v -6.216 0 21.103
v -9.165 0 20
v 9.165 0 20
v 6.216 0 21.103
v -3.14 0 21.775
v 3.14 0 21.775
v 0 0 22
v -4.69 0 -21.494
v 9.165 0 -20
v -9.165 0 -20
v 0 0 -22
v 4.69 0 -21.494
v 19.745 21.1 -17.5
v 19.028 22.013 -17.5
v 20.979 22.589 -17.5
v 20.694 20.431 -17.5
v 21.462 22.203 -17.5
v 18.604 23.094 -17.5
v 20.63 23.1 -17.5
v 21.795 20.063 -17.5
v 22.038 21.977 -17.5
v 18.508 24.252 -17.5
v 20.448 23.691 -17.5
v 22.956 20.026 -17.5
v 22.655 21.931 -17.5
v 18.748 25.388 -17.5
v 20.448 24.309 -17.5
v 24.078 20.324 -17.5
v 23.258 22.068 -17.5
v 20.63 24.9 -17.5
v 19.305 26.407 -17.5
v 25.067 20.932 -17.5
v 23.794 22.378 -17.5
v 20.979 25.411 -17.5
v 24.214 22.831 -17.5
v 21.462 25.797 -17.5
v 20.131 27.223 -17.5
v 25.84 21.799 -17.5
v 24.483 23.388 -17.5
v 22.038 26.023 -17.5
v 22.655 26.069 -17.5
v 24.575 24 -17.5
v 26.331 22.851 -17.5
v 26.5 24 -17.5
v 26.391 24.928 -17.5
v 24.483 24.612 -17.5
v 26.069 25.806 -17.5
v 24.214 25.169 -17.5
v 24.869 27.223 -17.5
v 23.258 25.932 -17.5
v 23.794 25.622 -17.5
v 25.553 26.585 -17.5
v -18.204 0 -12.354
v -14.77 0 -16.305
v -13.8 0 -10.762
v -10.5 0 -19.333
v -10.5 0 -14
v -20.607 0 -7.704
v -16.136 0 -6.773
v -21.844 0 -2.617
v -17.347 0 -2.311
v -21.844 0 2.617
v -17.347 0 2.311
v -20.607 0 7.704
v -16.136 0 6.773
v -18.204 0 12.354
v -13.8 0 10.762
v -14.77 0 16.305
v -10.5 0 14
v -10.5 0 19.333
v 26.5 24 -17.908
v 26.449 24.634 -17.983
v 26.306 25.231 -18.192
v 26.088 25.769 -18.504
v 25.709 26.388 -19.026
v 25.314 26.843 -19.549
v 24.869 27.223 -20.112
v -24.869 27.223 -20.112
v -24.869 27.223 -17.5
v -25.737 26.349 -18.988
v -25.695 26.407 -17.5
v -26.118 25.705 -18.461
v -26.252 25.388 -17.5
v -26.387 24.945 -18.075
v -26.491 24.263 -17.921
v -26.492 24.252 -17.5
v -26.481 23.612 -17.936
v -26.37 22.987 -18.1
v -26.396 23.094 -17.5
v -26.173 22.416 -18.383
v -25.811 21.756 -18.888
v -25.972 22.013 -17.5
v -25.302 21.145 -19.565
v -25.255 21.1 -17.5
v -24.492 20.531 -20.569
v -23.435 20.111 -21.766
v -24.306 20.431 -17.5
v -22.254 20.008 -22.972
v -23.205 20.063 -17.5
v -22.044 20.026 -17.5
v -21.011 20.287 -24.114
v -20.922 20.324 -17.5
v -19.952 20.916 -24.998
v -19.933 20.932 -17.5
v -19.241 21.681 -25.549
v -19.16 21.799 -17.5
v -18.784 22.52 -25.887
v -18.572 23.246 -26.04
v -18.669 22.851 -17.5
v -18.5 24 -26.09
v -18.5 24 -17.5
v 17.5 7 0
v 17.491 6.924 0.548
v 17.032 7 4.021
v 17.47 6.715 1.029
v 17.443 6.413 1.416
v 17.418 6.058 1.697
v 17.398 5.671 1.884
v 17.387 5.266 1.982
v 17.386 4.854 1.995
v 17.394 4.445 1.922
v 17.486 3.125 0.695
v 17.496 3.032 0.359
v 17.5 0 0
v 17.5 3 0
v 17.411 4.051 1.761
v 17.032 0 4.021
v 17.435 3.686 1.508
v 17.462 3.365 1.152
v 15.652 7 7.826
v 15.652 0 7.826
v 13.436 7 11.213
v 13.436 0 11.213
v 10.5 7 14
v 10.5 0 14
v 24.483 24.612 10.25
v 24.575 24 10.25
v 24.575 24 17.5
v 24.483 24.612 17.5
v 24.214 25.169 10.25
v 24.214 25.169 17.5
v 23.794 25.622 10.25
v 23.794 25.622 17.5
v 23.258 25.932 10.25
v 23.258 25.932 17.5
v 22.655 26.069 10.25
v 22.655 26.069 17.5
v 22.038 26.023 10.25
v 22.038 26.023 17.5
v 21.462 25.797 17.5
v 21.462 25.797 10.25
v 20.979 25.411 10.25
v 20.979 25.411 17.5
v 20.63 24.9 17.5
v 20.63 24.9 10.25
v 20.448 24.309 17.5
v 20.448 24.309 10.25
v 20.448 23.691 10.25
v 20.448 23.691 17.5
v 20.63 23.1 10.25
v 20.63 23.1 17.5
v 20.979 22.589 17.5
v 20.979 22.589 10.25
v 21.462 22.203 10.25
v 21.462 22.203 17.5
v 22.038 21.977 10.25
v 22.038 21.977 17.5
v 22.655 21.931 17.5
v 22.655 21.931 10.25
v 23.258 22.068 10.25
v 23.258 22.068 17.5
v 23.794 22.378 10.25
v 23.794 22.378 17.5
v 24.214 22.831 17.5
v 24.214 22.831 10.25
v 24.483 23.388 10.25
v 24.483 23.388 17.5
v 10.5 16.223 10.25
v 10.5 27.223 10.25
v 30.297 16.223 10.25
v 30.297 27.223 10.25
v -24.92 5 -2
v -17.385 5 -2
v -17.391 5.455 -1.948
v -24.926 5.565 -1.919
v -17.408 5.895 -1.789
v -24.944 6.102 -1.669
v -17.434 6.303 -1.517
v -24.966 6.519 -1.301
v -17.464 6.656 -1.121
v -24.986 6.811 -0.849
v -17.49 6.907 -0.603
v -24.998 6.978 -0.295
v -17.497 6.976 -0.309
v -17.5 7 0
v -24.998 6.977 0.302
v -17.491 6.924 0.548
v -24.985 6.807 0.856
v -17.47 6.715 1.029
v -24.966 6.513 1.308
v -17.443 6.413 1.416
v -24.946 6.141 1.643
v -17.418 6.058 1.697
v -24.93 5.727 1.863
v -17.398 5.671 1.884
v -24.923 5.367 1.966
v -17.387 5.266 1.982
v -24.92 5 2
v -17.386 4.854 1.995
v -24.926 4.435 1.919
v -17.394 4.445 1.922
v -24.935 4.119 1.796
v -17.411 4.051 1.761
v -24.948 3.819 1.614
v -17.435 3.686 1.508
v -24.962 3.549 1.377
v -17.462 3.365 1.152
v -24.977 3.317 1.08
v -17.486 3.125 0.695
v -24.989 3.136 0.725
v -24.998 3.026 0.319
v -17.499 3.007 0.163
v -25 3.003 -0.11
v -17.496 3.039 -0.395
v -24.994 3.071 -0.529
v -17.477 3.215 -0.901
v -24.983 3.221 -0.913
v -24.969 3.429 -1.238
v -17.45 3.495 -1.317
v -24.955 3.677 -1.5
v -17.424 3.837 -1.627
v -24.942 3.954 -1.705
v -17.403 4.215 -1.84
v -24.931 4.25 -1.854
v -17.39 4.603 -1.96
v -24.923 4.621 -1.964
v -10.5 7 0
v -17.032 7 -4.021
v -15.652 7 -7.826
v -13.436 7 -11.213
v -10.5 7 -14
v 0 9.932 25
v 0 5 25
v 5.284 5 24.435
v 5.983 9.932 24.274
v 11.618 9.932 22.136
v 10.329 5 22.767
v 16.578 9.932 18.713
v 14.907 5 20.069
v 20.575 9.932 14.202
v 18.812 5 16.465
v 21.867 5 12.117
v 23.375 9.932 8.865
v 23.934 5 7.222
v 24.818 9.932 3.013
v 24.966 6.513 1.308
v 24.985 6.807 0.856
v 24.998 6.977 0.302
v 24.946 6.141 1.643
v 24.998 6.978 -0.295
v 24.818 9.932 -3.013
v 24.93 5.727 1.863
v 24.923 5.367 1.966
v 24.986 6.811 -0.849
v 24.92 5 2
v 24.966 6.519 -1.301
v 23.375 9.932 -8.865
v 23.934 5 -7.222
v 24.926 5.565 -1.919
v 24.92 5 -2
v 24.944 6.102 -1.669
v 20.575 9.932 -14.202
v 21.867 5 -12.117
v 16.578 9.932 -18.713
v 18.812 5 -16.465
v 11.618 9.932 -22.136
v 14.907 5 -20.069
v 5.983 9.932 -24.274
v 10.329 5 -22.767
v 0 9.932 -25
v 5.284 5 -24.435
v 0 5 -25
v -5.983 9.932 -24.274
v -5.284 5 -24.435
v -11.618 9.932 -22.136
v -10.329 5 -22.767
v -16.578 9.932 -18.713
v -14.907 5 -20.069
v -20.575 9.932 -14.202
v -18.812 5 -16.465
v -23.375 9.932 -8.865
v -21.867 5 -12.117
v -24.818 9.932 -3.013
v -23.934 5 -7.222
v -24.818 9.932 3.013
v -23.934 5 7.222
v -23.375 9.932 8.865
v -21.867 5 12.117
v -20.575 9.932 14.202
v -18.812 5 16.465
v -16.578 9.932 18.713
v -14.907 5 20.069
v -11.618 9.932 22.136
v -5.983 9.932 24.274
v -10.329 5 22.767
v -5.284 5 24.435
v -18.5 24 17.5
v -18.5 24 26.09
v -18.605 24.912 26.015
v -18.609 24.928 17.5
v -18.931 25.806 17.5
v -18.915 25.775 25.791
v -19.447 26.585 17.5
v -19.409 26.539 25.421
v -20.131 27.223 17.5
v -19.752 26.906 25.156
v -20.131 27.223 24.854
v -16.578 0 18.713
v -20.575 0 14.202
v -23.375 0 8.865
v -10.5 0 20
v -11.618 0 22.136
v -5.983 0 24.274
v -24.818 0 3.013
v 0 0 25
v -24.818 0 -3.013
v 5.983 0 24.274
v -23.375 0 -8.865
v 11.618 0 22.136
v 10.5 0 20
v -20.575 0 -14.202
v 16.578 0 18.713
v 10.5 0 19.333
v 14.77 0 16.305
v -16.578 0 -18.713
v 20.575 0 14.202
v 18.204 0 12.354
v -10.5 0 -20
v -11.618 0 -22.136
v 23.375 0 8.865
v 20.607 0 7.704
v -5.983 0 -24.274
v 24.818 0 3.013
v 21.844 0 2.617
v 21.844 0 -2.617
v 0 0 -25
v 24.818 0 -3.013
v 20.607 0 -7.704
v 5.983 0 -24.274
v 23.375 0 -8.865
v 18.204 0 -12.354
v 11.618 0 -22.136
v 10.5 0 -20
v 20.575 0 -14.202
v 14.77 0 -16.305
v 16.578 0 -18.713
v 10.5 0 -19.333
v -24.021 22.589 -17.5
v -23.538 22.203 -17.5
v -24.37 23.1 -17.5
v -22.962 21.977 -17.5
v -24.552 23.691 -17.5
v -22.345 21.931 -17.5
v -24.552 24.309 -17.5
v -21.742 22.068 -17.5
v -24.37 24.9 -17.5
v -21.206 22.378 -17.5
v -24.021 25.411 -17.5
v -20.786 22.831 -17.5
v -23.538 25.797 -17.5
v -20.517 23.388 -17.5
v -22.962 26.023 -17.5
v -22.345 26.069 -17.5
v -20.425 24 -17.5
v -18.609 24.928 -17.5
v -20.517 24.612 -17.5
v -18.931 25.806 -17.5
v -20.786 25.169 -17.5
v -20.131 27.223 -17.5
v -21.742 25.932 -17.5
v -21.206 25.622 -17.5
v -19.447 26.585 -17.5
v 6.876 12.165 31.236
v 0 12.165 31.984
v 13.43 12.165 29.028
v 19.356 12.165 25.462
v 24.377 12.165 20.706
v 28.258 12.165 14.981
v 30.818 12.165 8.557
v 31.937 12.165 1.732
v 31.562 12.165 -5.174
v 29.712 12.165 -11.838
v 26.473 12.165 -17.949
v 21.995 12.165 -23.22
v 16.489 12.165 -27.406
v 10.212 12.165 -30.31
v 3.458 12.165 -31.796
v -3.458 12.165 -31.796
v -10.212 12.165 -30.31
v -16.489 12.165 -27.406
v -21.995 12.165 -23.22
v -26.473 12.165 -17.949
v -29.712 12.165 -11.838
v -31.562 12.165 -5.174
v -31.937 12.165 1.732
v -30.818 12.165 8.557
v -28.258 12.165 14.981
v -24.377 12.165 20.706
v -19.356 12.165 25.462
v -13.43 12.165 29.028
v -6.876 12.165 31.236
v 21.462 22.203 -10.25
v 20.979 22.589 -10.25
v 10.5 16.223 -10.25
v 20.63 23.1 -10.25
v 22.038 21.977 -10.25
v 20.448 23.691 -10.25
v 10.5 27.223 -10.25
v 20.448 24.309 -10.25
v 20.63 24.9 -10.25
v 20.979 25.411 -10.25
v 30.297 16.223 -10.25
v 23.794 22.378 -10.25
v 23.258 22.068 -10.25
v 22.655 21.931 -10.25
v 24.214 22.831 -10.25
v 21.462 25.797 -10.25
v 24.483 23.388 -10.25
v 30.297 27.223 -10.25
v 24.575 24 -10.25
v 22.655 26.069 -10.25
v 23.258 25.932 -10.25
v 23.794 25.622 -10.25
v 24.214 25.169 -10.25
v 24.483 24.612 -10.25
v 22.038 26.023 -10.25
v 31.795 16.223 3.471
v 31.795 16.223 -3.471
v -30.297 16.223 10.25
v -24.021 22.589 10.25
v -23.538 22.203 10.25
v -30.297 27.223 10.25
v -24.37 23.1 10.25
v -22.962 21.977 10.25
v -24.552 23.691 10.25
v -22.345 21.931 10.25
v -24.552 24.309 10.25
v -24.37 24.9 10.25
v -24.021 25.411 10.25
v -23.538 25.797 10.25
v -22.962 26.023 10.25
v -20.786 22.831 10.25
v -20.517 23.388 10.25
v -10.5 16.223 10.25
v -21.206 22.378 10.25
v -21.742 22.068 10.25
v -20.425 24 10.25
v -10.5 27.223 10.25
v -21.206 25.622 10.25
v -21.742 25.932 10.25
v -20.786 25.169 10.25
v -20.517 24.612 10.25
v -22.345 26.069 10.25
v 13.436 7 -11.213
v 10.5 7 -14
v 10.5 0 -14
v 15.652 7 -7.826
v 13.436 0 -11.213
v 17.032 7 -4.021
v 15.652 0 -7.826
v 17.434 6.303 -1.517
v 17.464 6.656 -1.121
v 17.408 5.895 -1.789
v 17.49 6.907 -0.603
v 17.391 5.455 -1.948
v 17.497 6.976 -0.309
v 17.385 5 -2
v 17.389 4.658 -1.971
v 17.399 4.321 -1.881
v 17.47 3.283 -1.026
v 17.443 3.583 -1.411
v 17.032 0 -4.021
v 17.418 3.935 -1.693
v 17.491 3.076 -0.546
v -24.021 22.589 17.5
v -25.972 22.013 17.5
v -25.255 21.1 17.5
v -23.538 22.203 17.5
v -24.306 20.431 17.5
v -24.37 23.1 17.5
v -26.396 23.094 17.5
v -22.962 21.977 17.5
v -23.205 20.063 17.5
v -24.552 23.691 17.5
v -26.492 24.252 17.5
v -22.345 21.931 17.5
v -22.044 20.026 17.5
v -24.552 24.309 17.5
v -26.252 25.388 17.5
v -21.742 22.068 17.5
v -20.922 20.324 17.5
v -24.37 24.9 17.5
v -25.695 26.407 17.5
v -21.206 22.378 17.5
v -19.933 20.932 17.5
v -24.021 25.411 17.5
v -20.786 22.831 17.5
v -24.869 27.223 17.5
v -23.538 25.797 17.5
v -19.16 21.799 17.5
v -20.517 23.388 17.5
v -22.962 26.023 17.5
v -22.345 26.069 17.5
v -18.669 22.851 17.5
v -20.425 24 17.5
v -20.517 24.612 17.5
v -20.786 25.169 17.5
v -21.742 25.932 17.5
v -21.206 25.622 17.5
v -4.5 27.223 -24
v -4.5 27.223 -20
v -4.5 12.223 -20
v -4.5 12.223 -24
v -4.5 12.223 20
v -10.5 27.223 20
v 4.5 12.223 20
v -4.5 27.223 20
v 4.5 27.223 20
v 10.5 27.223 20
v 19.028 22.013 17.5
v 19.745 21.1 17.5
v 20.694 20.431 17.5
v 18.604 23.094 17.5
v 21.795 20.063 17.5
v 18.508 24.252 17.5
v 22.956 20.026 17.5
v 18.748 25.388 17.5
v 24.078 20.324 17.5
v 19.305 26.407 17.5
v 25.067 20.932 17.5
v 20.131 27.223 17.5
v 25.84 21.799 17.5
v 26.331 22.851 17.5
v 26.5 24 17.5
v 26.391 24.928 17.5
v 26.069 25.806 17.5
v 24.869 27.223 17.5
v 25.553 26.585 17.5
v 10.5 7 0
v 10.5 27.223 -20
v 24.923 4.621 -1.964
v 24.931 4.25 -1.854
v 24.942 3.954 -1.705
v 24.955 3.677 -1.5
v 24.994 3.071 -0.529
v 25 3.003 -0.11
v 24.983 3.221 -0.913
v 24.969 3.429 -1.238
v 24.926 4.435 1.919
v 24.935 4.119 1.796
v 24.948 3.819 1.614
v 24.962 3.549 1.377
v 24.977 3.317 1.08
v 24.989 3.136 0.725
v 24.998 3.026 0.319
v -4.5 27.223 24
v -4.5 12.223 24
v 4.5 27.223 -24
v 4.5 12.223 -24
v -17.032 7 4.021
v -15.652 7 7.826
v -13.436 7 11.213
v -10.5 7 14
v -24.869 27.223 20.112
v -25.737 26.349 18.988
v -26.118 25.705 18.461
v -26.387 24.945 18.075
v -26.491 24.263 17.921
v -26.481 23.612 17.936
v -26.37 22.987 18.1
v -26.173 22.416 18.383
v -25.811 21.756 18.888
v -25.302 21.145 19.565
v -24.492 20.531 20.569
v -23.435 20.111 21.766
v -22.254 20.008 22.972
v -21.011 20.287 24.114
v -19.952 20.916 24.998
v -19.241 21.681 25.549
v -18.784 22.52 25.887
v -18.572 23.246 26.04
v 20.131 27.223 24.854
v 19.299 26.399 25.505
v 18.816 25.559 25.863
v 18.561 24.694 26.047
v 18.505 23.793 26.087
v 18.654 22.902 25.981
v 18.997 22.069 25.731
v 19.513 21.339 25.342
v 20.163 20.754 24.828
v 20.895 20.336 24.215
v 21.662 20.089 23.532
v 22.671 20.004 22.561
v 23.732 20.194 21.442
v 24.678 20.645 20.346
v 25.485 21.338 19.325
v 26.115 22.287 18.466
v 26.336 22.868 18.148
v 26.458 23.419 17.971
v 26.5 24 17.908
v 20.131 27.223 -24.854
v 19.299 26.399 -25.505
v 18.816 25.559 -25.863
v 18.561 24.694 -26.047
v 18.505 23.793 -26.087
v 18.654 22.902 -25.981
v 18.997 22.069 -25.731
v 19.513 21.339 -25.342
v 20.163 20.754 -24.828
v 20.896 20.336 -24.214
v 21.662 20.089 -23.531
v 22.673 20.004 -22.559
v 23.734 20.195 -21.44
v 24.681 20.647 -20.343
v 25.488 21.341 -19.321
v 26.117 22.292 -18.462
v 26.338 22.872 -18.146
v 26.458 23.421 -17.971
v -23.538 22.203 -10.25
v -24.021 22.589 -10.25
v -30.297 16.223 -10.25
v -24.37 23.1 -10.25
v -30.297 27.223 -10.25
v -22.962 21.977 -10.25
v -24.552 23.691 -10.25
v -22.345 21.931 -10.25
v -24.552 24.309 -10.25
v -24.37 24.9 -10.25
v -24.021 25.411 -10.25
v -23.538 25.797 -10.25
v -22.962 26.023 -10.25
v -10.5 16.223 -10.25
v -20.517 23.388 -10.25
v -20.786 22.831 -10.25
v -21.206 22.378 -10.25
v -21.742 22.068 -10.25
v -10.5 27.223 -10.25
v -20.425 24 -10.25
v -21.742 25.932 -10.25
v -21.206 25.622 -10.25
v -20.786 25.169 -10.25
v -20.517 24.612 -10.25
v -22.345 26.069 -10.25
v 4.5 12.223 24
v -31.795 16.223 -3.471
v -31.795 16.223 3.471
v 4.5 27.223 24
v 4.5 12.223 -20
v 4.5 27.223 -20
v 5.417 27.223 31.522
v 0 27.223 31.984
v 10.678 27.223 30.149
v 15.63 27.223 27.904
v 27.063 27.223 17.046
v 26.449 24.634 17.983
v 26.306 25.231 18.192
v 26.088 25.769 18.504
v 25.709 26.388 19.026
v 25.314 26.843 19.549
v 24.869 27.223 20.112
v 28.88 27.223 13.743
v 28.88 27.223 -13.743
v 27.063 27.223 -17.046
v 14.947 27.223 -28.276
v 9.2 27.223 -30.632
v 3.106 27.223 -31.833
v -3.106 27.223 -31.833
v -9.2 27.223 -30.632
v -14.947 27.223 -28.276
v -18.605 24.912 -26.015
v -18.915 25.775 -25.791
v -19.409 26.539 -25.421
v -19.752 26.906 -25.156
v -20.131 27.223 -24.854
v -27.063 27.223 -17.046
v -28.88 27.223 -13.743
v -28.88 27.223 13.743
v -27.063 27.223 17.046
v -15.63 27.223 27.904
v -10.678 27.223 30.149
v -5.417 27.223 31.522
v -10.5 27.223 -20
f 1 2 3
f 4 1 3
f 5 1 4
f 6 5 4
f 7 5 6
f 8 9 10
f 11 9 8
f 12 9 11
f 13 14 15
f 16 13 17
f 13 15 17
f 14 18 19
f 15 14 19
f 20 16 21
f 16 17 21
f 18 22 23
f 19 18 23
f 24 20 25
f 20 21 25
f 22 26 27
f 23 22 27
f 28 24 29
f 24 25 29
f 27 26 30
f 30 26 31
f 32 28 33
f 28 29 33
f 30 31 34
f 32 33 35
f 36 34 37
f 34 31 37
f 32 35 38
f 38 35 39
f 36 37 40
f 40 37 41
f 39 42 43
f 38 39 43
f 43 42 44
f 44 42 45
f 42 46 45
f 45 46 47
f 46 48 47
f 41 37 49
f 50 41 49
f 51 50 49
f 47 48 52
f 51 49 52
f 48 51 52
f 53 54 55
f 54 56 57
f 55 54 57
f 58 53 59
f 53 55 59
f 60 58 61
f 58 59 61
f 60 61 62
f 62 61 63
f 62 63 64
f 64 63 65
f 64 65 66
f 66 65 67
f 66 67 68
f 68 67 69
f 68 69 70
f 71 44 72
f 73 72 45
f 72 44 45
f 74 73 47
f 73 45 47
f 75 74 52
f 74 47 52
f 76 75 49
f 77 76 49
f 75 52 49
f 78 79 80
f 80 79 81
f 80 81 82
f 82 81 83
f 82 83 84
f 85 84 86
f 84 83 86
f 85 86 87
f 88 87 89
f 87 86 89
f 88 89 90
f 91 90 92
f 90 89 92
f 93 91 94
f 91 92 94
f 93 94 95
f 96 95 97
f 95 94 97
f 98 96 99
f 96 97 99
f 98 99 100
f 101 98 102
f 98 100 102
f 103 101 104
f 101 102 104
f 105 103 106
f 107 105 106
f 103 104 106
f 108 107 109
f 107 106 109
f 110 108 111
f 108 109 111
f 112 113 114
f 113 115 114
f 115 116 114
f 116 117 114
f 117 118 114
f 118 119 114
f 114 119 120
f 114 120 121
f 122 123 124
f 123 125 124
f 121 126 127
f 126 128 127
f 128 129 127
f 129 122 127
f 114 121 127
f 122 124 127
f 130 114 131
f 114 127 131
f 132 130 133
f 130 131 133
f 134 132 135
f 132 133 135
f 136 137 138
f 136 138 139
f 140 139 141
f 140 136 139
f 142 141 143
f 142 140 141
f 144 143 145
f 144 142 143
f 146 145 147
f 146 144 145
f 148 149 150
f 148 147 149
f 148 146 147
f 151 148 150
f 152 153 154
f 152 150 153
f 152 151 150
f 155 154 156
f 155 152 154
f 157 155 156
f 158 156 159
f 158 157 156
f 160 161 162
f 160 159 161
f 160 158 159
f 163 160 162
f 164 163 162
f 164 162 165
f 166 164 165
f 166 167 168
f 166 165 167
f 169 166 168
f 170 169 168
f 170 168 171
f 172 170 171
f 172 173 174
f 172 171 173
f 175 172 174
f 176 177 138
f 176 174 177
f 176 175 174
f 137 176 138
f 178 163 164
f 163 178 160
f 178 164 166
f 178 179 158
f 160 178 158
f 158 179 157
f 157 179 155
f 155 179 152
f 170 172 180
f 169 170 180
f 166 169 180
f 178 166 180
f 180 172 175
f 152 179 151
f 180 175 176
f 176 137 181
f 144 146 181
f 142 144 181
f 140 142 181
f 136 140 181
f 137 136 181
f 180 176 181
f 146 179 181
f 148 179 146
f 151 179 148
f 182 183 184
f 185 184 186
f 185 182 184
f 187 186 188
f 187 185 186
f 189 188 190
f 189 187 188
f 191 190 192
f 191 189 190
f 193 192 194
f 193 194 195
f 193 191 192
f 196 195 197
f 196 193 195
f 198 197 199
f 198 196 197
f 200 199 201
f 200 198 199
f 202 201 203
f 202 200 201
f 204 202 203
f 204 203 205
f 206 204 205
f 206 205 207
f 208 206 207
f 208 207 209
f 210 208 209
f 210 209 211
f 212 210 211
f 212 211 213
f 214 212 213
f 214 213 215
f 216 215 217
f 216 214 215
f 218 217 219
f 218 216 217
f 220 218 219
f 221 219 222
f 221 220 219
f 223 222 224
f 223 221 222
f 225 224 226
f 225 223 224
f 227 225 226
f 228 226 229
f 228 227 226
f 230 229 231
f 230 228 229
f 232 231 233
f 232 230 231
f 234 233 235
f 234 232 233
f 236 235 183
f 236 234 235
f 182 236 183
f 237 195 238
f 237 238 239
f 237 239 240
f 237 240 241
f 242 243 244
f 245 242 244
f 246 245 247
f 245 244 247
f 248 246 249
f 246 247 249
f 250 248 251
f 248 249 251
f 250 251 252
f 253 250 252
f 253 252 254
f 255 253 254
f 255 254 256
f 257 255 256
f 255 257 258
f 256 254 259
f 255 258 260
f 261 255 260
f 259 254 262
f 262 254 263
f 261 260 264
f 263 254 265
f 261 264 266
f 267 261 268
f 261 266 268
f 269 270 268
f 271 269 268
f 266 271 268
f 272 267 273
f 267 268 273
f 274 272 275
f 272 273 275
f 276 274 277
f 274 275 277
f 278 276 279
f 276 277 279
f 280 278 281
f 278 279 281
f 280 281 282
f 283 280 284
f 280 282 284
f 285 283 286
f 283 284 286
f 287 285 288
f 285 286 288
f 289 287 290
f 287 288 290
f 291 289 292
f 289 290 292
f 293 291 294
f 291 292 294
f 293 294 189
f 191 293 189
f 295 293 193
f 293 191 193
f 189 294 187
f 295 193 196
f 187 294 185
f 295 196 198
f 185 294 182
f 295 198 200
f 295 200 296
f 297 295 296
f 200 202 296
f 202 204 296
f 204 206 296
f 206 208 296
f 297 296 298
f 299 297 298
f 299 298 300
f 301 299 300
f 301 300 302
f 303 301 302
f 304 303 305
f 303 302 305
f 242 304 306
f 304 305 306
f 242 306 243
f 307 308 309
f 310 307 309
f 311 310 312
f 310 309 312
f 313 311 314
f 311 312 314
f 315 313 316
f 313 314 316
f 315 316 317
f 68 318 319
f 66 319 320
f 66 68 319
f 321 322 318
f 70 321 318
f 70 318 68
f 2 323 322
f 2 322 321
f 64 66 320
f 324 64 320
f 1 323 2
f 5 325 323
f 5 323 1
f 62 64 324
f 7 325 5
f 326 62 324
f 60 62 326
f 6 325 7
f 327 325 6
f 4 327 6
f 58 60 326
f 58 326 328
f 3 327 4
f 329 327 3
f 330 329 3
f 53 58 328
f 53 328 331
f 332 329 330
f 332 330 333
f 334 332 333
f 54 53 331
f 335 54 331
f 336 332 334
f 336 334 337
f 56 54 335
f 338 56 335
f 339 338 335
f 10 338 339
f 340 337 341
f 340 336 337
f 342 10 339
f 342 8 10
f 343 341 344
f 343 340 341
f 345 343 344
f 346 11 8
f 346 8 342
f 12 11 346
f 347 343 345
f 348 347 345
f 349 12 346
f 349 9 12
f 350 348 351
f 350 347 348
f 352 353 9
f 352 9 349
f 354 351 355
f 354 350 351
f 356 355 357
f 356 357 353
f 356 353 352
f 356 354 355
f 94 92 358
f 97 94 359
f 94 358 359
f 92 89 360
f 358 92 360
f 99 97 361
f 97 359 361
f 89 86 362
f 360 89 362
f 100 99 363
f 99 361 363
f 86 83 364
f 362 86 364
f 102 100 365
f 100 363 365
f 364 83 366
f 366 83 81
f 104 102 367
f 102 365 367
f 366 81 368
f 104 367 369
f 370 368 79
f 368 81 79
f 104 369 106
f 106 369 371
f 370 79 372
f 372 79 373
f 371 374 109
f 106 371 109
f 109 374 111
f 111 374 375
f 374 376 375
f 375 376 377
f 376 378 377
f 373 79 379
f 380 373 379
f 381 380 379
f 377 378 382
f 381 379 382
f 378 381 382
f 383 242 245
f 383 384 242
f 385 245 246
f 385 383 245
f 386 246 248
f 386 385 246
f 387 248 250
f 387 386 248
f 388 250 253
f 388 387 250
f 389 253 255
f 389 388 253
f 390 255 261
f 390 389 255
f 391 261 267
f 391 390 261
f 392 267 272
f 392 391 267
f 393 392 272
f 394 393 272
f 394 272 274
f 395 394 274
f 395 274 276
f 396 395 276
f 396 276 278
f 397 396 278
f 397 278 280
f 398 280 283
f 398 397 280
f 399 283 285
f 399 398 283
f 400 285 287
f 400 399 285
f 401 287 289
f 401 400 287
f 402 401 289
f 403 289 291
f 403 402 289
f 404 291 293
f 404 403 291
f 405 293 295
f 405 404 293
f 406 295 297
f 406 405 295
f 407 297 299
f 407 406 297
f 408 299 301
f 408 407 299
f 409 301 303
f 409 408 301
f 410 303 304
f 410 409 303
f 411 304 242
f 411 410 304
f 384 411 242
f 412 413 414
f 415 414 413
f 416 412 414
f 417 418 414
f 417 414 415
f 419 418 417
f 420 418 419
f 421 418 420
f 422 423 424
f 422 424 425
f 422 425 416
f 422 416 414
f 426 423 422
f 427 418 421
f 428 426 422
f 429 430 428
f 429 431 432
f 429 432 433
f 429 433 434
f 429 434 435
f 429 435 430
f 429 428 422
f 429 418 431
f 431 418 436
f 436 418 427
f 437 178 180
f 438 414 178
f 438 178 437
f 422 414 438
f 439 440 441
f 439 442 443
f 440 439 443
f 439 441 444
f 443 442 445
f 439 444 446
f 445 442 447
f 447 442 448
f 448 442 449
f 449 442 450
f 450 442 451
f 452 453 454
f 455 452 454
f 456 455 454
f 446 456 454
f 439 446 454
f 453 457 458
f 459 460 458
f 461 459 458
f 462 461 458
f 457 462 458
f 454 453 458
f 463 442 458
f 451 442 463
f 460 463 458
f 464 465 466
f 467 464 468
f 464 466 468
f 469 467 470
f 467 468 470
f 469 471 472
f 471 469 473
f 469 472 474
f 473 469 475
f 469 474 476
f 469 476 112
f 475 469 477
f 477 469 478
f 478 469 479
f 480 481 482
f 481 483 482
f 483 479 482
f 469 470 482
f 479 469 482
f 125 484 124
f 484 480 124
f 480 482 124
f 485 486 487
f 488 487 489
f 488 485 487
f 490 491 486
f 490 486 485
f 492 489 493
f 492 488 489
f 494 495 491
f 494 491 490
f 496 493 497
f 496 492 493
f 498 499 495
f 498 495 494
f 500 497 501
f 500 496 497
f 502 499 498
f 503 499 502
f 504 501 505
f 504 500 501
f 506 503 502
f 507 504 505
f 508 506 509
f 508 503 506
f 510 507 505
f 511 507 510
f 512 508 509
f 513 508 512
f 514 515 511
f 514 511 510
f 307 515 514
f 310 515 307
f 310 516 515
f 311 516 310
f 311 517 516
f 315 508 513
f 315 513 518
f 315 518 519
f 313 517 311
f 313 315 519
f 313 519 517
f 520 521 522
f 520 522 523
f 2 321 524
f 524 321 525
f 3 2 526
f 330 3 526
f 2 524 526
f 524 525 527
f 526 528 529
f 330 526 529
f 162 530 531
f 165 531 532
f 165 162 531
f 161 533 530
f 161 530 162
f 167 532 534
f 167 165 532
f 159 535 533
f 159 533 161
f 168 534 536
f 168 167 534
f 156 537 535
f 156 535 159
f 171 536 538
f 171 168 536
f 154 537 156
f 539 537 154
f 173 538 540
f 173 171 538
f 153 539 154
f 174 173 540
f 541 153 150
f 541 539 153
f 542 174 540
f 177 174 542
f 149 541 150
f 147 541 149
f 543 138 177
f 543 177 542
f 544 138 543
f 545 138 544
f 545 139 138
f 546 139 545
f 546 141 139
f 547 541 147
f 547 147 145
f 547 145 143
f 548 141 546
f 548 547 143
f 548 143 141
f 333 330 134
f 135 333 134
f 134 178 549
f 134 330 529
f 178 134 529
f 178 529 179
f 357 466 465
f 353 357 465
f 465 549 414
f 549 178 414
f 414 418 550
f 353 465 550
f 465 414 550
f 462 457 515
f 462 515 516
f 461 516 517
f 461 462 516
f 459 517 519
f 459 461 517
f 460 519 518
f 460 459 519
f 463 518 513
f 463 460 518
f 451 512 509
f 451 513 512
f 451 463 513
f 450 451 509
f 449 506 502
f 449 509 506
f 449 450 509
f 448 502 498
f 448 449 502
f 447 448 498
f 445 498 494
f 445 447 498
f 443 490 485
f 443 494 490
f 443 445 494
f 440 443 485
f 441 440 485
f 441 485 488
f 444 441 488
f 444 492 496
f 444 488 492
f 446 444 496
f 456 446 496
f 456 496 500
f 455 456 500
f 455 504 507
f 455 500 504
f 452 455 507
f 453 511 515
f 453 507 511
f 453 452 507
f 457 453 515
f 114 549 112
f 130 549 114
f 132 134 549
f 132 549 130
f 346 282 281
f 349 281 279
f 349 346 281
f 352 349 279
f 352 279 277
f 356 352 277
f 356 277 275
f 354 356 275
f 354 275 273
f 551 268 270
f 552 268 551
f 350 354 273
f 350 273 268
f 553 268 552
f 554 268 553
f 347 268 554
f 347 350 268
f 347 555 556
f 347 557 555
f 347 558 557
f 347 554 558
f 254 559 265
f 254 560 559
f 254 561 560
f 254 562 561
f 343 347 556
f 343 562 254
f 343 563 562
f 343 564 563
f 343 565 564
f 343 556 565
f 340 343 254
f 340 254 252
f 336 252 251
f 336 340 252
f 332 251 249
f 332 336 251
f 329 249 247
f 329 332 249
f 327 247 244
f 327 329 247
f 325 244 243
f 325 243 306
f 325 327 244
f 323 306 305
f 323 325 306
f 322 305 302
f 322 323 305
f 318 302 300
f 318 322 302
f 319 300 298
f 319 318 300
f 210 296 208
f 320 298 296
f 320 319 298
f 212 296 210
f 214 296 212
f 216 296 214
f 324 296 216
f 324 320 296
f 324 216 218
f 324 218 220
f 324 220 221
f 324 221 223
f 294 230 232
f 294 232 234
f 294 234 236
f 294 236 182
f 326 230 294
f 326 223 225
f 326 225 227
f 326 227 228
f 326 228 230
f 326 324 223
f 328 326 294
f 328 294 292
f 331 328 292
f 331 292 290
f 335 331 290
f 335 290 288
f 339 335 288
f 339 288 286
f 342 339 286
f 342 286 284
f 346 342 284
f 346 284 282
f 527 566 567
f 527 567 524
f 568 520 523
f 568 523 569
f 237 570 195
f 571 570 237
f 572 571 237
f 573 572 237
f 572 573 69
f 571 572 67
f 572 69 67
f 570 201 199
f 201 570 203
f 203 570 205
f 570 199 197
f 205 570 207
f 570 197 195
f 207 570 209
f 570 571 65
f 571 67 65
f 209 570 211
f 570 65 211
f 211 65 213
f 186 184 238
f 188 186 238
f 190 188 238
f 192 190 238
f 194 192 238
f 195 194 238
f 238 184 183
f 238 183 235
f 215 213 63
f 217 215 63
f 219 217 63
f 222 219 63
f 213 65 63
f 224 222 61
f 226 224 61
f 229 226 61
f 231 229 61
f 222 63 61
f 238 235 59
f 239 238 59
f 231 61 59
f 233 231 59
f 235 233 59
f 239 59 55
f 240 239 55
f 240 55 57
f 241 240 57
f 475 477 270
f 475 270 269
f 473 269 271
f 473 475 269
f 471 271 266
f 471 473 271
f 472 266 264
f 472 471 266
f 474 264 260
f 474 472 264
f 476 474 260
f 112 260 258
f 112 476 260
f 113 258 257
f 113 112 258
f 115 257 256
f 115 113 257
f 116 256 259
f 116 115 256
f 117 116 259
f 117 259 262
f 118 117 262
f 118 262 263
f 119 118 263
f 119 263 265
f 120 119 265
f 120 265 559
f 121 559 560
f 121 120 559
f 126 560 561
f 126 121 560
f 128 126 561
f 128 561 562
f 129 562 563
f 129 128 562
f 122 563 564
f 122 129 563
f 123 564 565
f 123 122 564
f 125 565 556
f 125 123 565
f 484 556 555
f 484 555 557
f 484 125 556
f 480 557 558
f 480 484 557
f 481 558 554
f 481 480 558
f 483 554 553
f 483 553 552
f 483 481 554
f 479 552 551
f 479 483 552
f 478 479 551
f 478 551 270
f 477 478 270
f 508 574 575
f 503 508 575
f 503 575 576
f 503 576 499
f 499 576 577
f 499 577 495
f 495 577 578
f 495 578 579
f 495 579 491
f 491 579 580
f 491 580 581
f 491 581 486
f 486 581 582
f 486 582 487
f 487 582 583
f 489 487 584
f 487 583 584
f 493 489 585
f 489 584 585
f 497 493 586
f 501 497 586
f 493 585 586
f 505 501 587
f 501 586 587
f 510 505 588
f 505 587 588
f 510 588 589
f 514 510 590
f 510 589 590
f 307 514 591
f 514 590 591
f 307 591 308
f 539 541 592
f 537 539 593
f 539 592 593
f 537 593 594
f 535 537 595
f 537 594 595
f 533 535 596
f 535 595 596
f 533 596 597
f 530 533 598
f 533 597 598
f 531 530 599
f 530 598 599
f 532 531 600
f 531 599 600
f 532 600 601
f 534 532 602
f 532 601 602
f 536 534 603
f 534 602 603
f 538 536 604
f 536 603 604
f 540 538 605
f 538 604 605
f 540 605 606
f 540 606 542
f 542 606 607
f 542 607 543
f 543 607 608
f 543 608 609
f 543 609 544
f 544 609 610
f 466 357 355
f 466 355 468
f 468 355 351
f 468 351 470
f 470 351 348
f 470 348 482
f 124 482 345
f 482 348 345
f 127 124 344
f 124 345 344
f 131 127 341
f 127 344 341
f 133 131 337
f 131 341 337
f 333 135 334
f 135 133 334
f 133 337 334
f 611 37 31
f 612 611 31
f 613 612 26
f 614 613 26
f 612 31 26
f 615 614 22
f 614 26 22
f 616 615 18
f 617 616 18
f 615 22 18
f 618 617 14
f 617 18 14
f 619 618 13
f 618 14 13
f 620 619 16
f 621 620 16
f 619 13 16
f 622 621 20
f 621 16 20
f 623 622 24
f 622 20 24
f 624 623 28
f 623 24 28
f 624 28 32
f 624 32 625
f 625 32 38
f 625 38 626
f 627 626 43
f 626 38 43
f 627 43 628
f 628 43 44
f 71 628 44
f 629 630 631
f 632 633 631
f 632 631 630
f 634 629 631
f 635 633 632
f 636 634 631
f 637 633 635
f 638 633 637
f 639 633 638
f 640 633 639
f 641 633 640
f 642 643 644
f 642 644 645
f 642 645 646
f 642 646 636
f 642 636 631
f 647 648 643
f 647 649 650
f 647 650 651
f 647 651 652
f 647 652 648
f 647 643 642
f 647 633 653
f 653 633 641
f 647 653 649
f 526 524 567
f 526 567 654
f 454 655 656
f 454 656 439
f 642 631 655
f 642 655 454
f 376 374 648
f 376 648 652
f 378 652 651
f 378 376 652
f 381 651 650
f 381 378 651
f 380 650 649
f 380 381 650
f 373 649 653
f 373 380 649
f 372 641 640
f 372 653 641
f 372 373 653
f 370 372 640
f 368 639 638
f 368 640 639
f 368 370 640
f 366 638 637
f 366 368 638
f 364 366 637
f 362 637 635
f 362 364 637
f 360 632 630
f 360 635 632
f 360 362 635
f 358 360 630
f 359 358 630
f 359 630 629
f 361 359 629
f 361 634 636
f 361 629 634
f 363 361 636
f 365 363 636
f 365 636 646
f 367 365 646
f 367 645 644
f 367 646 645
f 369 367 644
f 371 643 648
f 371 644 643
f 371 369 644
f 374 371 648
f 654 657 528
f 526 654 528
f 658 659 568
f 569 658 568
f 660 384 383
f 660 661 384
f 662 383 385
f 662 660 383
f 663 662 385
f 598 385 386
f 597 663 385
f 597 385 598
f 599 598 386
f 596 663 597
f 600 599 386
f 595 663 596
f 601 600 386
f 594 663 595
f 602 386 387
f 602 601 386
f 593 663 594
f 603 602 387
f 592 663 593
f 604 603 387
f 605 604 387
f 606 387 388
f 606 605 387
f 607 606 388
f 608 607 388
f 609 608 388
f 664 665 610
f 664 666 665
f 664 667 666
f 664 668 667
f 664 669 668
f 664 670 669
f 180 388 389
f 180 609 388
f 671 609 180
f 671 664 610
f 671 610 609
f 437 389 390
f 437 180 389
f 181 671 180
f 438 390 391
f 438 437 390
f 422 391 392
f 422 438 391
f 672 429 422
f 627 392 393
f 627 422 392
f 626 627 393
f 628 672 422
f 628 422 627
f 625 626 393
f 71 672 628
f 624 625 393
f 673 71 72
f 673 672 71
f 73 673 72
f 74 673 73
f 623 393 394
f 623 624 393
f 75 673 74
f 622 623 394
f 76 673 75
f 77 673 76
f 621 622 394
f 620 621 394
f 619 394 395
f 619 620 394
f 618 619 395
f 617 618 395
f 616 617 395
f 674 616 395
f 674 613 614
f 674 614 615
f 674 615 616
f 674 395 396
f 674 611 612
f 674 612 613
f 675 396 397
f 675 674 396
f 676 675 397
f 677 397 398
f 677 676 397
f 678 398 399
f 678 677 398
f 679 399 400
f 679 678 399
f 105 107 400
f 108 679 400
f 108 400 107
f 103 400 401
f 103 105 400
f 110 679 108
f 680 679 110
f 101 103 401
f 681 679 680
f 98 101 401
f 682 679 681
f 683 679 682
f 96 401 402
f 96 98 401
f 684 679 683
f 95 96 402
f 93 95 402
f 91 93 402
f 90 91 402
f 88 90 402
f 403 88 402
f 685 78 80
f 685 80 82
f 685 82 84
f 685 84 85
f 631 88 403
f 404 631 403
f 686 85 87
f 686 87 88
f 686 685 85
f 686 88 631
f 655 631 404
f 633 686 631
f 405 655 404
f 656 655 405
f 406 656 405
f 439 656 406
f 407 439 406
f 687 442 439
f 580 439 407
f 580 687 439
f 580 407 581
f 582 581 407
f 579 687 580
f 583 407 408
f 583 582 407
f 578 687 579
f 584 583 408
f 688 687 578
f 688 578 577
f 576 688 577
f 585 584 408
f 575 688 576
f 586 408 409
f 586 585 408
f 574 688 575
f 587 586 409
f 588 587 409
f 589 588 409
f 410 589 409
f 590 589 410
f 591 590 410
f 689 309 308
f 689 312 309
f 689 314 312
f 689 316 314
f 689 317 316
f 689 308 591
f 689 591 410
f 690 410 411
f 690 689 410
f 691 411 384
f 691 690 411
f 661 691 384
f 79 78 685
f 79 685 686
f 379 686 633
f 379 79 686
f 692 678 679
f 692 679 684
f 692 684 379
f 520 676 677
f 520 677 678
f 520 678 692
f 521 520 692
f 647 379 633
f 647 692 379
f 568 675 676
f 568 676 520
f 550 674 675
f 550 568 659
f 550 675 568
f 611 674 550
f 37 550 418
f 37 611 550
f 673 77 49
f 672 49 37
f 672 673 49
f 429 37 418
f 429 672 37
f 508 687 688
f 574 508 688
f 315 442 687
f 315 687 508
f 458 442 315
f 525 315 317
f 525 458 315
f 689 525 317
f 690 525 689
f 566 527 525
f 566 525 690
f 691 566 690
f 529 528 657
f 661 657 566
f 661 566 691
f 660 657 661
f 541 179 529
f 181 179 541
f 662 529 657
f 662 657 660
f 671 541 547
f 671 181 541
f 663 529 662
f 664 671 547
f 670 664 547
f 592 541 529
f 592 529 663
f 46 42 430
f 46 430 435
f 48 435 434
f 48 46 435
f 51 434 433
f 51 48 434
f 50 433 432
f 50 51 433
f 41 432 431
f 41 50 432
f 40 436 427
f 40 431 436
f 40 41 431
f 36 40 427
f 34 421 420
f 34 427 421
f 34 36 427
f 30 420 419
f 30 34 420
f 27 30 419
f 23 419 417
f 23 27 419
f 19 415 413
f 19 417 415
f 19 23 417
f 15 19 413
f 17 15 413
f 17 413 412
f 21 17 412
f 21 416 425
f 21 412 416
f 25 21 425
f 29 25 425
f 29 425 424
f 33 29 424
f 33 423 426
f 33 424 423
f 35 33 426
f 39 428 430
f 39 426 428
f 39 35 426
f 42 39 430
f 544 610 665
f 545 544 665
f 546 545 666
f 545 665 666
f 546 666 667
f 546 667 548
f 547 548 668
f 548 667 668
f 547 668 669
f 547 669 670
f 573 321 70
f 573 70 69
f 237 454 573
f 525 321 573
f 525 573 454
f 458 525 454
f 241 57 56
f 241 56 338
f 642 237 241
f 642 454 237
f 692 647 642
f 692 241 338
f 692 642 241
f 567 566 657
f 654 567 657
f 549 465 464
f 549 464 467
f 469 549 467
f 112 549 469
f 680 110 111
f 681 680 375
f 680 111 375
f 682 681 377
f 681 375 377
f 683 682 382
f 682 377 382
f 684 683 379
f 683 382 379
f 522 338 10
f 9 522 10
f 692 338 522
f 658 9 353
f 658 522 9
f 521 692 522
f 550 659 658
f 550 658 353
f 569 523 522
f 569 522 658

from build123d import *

# Parameters (mm, degrees)
SKETCH1_R               = 22
BOSS_EXTRUDE1_DEPTH     = 5
SKETCH2_R               = 25
BOSS_EXTRUDE2_DEPTH     = 5
SKETCH3_R               = 7.5
CUT_EXTRUDE1_DEPTH      = 16
SKETCH5_W               = 72.120743336
SKETCH5_H               = 20.5
CUT_EXTRUDE2_DEPTH      = 11
CUT_EXTRUDE3_DEPTH      = 53.792161073
CUT_EXTRUDE3_DEPTH_BACK = 53.792161073
SKETCH6_R               = 2.075
BOSS_EXTRUDE3_START     = 5
SKETCH7_R               = 25
SKETCH7_R_2             = 12.5
BOSS_EXTRUDE3_DEPTH     = 5
CUT_EXTRUDE4_DEPTH      = 53.792161246
CUT_EXTRUDE4_DEPTH_BACK = 53.792161246
SKETCH8_R               = 2
SKETCH9_W               = 21
SKETCH9_H               = 40
CUT_EXTRUDE5_DEPTH      = 31
SKETCH11_R              = 17.5
CUT_EXTRUDE7_DEPTH      = 7
CUT_EXTRUDE10_START     = 26.5
SKETCH14_R              = 4
CUT_EXTRUDE10_DEPTH     = 9
SKETCH21_W              = 9
SKETCH21_H              = 4
CUT_EXTRUDE12_DEPTH     = 15
SKETCH22_W              = 9
SKETCH22_H              = 4
CUT_EXTRUDE13_DEPTH     = 15
CUT_EXTRUDE14_START     = -17.5
SKETCH24_R              = 4
CUT_EXTRUDE14_DEPTH     = 15
CUT_EXTRUDE15_START     = -17.5
SKETCH25_R              = 4
CUT_EXTRUDE15_DEPTH     = 15
CUT_EXTRUDE16_START     = 32.5
SKETCH26_R              = 4
CUT_EXTRUDE16_DEPTH     = 15


with BuildPart() as part:
    # Sketch1 → Boss-Extrude1 (new body)
    with BuildSketch(Plane(origin=(0, 0, 0), x_dir=(1, 0, 0), z_dir=(0, 1, 0))):
        Circle(SKETCH1_R)
    extrude(amount=BOSS_EXTRUDE1_DEPTH)

    # Sketch2 → Boss-Extrude2 (add)
    with BuildSketch(Plane(origin=(0, 5, 0), x_dir=(1, 0, 0), z_dir=(0, 1, 0))):
        Circle(SKETCH2_R)
    extrude(amount=BOSS_EXTRUDE2_DEPTH)

    # Sketch3 → Cut-Extrude1 (cut)
    with BuildSketch(Plane(origin=(0, 10, 0), x_dir=(1, 0, 0), z_dir=(0, 1, 0))):
        Circle(SKETCH3_R)
    extrude(amount=-CUT_EXTRUDE1_DEPTH, mode=Mode.SUBTRACT)

    # Sketch4 → Revolve1 (revolve)
    with BuildSketch(Plane(origin=(0, 0, 0), x_dir=(0, 0, -1), z_dir=(1, 0, 0))):
        Polygon((-9.617585302, 7.278489703), (-16.698024184, 7.278489703), (-31.98380954, 12.164514858), (-31.98380954, 27.222860345), (-9.617585302, 27.222860345), align=None)
    revolve(axis=Axis((0, 0, 0), (0, 1, 0)))

    # Sketch5 → Cut-Extrude2 (cut)
    with BuildSketch(Plane(origin=(0, 27.222860345, 0), x_dir=(1, 0, 0), z_dir=(0, 1, 0))):
        Rectangle(SKETCH5_W, SKETCH5_H)
    extrude(amount=-CUT_EXTRUDE2_DEPTH, mode=Mode.SUBTRACT)

    # Sketch6 → Cut-Extrude3 (cut, two sides: drawn at the far end of the back side and taken through both)
    with BuildSketch(Plane.XY.offset(-CUT_EXTRUDE3_DEPTH_BACK)):
        with Locations((-22.5, 24)):
            Circle(SKETCH6_R)
        with Locations((22.5, 24)):
            Circle(SKETCH6_R)
    extrude(amount=CUT_EXTRUDE3_DEPTH + CUT_EXTRUDE3_DEPTH_BACK, mode=Mode.SUBTRACT)

    # Sketch7 → Boss-Extrude3 (add)
    with BuildSketch(Plane.XZ.offset(-5).offset(BOSS_EXTRUDE3_START)):
        Circle(SKETCH7_R)
        Circle(SKETCH7_R_2, mode=Mode.SUBTRACT)
    extrude(amount=-BOSS_EXTRUDE3_DEPTH)

    # Sketch8 → Cut-Extrude4 (cut, two sides: drawn at the far end of the back side and taken through both)
    with BuildSketch(Plane(origin=(0, 0, 0), x_dir=(0, 0, -1), z_dir=(1, 0, 0)).offset(-CUT_EXTRUDE4_DEPTH_BACK)):
        with Locations((0, 5)):
            Circle(SKETCH8_R)
    extrude(amount=CUT_EXTRUDE4_DEPTH + CUT_EXTRUDE4_DEPTH_BACK, mode=Mode.SUBTRACT)

    # Sketch9 → Cut-Extrude5 (cut)
    with BuildSketch(Plane(origin=(0, 27.222860345, 0), x_dir=(1, 0, 0), z_dir=(0, 1, 0))):
        Rectangle(SKETCH9_W, SKETCH9_H)
    extrude(amount=-CUT_EXTRUDE5_DEPTH, mode=Mode.SUBTRACT)

    # Sketch11 → Cut-Extrude7 (cut)
    with BuildSketch(Plane.XZ):
        Circle(SKETCH11_R)
    extrude(amount=-CUT_EXTRUDE7_DEPTH, mode=Mode.SUBTRACT)

    # Sketch14 → Cut-Extrude10 (cut)
    with BuildSketch(Plane.XY.offset(CUT_EXTRUDE10_START)):
        with Locations((22.5, 24)):
            Circle(SKETCH14_R)
    extrude(amount=-CUT_EXTRUDE10_DEPTH, mode=Mode.SUBTRACT)

    # Sketch21 → Cut-Extrude12 (cut)
    with BuildSketch(Plane(origin=(0, 27.222860345, 0), x_dir=(1, 0, 0), z_dir=(0, 1, 0))):
        with Locations((0, -22)):
            Rectangle(SKETCH21_W, SKETCH21_H)
    extrude(amount=-CUT_EXTRUDE12_DEPTH, mode=Mode.SUBTRACT)

    # Sketch22 → Cut-Extrude13 (cut)
    with BuildSketch(Plane(origin=(0, 27.222860345, 0), x_dir=(1, 0, 0), z_dir=(0, 1, 0))):
        with Locations((0, 22)):
            Rectangle(SKETCH22_W, SKETCH22_H)
    extrude(amount=-CUT_EXTRUDE13_DEPTH, mode=Mode.SUBTRACT)

    # Sketch24 → Cut-Extrude14 (cut)
    with BuildSketch(Plane.XY.offset(CUT_EXTRUDE14_START)):
        with Locations((22.5, 24)):
            Circle(SKETCH24_R)
    extrude(amount=-CUT_EXTRUDE14_DEPTH, mode=Mode.SUBTRACT)

    # Sketch25 → Cut-Extrude15 (cut)
    with BuildSketch(Plane.XY.offset(CUT_EXTRUDE15_START)):
        with Locations((-22.5, 24)):
            Circle(SKETCH25_R)
    extrude(amount=-CUT_EXTRUDE15_DEPTH, mode=Mode.SUBTRACT)

    # Sketch26 → Cut-Extrude16 (cut)
    with BuildSketch(Plane.XY.offset(CUT_EXTRUDE16_START)):
        with Locations((-22.5, 24)):
            Circle(SKETCH26_R)
    extrude(amount=-CUT_EXTRUDE16_DEPTH, mode=Mode.SUBTRACT)


solid = part.part
